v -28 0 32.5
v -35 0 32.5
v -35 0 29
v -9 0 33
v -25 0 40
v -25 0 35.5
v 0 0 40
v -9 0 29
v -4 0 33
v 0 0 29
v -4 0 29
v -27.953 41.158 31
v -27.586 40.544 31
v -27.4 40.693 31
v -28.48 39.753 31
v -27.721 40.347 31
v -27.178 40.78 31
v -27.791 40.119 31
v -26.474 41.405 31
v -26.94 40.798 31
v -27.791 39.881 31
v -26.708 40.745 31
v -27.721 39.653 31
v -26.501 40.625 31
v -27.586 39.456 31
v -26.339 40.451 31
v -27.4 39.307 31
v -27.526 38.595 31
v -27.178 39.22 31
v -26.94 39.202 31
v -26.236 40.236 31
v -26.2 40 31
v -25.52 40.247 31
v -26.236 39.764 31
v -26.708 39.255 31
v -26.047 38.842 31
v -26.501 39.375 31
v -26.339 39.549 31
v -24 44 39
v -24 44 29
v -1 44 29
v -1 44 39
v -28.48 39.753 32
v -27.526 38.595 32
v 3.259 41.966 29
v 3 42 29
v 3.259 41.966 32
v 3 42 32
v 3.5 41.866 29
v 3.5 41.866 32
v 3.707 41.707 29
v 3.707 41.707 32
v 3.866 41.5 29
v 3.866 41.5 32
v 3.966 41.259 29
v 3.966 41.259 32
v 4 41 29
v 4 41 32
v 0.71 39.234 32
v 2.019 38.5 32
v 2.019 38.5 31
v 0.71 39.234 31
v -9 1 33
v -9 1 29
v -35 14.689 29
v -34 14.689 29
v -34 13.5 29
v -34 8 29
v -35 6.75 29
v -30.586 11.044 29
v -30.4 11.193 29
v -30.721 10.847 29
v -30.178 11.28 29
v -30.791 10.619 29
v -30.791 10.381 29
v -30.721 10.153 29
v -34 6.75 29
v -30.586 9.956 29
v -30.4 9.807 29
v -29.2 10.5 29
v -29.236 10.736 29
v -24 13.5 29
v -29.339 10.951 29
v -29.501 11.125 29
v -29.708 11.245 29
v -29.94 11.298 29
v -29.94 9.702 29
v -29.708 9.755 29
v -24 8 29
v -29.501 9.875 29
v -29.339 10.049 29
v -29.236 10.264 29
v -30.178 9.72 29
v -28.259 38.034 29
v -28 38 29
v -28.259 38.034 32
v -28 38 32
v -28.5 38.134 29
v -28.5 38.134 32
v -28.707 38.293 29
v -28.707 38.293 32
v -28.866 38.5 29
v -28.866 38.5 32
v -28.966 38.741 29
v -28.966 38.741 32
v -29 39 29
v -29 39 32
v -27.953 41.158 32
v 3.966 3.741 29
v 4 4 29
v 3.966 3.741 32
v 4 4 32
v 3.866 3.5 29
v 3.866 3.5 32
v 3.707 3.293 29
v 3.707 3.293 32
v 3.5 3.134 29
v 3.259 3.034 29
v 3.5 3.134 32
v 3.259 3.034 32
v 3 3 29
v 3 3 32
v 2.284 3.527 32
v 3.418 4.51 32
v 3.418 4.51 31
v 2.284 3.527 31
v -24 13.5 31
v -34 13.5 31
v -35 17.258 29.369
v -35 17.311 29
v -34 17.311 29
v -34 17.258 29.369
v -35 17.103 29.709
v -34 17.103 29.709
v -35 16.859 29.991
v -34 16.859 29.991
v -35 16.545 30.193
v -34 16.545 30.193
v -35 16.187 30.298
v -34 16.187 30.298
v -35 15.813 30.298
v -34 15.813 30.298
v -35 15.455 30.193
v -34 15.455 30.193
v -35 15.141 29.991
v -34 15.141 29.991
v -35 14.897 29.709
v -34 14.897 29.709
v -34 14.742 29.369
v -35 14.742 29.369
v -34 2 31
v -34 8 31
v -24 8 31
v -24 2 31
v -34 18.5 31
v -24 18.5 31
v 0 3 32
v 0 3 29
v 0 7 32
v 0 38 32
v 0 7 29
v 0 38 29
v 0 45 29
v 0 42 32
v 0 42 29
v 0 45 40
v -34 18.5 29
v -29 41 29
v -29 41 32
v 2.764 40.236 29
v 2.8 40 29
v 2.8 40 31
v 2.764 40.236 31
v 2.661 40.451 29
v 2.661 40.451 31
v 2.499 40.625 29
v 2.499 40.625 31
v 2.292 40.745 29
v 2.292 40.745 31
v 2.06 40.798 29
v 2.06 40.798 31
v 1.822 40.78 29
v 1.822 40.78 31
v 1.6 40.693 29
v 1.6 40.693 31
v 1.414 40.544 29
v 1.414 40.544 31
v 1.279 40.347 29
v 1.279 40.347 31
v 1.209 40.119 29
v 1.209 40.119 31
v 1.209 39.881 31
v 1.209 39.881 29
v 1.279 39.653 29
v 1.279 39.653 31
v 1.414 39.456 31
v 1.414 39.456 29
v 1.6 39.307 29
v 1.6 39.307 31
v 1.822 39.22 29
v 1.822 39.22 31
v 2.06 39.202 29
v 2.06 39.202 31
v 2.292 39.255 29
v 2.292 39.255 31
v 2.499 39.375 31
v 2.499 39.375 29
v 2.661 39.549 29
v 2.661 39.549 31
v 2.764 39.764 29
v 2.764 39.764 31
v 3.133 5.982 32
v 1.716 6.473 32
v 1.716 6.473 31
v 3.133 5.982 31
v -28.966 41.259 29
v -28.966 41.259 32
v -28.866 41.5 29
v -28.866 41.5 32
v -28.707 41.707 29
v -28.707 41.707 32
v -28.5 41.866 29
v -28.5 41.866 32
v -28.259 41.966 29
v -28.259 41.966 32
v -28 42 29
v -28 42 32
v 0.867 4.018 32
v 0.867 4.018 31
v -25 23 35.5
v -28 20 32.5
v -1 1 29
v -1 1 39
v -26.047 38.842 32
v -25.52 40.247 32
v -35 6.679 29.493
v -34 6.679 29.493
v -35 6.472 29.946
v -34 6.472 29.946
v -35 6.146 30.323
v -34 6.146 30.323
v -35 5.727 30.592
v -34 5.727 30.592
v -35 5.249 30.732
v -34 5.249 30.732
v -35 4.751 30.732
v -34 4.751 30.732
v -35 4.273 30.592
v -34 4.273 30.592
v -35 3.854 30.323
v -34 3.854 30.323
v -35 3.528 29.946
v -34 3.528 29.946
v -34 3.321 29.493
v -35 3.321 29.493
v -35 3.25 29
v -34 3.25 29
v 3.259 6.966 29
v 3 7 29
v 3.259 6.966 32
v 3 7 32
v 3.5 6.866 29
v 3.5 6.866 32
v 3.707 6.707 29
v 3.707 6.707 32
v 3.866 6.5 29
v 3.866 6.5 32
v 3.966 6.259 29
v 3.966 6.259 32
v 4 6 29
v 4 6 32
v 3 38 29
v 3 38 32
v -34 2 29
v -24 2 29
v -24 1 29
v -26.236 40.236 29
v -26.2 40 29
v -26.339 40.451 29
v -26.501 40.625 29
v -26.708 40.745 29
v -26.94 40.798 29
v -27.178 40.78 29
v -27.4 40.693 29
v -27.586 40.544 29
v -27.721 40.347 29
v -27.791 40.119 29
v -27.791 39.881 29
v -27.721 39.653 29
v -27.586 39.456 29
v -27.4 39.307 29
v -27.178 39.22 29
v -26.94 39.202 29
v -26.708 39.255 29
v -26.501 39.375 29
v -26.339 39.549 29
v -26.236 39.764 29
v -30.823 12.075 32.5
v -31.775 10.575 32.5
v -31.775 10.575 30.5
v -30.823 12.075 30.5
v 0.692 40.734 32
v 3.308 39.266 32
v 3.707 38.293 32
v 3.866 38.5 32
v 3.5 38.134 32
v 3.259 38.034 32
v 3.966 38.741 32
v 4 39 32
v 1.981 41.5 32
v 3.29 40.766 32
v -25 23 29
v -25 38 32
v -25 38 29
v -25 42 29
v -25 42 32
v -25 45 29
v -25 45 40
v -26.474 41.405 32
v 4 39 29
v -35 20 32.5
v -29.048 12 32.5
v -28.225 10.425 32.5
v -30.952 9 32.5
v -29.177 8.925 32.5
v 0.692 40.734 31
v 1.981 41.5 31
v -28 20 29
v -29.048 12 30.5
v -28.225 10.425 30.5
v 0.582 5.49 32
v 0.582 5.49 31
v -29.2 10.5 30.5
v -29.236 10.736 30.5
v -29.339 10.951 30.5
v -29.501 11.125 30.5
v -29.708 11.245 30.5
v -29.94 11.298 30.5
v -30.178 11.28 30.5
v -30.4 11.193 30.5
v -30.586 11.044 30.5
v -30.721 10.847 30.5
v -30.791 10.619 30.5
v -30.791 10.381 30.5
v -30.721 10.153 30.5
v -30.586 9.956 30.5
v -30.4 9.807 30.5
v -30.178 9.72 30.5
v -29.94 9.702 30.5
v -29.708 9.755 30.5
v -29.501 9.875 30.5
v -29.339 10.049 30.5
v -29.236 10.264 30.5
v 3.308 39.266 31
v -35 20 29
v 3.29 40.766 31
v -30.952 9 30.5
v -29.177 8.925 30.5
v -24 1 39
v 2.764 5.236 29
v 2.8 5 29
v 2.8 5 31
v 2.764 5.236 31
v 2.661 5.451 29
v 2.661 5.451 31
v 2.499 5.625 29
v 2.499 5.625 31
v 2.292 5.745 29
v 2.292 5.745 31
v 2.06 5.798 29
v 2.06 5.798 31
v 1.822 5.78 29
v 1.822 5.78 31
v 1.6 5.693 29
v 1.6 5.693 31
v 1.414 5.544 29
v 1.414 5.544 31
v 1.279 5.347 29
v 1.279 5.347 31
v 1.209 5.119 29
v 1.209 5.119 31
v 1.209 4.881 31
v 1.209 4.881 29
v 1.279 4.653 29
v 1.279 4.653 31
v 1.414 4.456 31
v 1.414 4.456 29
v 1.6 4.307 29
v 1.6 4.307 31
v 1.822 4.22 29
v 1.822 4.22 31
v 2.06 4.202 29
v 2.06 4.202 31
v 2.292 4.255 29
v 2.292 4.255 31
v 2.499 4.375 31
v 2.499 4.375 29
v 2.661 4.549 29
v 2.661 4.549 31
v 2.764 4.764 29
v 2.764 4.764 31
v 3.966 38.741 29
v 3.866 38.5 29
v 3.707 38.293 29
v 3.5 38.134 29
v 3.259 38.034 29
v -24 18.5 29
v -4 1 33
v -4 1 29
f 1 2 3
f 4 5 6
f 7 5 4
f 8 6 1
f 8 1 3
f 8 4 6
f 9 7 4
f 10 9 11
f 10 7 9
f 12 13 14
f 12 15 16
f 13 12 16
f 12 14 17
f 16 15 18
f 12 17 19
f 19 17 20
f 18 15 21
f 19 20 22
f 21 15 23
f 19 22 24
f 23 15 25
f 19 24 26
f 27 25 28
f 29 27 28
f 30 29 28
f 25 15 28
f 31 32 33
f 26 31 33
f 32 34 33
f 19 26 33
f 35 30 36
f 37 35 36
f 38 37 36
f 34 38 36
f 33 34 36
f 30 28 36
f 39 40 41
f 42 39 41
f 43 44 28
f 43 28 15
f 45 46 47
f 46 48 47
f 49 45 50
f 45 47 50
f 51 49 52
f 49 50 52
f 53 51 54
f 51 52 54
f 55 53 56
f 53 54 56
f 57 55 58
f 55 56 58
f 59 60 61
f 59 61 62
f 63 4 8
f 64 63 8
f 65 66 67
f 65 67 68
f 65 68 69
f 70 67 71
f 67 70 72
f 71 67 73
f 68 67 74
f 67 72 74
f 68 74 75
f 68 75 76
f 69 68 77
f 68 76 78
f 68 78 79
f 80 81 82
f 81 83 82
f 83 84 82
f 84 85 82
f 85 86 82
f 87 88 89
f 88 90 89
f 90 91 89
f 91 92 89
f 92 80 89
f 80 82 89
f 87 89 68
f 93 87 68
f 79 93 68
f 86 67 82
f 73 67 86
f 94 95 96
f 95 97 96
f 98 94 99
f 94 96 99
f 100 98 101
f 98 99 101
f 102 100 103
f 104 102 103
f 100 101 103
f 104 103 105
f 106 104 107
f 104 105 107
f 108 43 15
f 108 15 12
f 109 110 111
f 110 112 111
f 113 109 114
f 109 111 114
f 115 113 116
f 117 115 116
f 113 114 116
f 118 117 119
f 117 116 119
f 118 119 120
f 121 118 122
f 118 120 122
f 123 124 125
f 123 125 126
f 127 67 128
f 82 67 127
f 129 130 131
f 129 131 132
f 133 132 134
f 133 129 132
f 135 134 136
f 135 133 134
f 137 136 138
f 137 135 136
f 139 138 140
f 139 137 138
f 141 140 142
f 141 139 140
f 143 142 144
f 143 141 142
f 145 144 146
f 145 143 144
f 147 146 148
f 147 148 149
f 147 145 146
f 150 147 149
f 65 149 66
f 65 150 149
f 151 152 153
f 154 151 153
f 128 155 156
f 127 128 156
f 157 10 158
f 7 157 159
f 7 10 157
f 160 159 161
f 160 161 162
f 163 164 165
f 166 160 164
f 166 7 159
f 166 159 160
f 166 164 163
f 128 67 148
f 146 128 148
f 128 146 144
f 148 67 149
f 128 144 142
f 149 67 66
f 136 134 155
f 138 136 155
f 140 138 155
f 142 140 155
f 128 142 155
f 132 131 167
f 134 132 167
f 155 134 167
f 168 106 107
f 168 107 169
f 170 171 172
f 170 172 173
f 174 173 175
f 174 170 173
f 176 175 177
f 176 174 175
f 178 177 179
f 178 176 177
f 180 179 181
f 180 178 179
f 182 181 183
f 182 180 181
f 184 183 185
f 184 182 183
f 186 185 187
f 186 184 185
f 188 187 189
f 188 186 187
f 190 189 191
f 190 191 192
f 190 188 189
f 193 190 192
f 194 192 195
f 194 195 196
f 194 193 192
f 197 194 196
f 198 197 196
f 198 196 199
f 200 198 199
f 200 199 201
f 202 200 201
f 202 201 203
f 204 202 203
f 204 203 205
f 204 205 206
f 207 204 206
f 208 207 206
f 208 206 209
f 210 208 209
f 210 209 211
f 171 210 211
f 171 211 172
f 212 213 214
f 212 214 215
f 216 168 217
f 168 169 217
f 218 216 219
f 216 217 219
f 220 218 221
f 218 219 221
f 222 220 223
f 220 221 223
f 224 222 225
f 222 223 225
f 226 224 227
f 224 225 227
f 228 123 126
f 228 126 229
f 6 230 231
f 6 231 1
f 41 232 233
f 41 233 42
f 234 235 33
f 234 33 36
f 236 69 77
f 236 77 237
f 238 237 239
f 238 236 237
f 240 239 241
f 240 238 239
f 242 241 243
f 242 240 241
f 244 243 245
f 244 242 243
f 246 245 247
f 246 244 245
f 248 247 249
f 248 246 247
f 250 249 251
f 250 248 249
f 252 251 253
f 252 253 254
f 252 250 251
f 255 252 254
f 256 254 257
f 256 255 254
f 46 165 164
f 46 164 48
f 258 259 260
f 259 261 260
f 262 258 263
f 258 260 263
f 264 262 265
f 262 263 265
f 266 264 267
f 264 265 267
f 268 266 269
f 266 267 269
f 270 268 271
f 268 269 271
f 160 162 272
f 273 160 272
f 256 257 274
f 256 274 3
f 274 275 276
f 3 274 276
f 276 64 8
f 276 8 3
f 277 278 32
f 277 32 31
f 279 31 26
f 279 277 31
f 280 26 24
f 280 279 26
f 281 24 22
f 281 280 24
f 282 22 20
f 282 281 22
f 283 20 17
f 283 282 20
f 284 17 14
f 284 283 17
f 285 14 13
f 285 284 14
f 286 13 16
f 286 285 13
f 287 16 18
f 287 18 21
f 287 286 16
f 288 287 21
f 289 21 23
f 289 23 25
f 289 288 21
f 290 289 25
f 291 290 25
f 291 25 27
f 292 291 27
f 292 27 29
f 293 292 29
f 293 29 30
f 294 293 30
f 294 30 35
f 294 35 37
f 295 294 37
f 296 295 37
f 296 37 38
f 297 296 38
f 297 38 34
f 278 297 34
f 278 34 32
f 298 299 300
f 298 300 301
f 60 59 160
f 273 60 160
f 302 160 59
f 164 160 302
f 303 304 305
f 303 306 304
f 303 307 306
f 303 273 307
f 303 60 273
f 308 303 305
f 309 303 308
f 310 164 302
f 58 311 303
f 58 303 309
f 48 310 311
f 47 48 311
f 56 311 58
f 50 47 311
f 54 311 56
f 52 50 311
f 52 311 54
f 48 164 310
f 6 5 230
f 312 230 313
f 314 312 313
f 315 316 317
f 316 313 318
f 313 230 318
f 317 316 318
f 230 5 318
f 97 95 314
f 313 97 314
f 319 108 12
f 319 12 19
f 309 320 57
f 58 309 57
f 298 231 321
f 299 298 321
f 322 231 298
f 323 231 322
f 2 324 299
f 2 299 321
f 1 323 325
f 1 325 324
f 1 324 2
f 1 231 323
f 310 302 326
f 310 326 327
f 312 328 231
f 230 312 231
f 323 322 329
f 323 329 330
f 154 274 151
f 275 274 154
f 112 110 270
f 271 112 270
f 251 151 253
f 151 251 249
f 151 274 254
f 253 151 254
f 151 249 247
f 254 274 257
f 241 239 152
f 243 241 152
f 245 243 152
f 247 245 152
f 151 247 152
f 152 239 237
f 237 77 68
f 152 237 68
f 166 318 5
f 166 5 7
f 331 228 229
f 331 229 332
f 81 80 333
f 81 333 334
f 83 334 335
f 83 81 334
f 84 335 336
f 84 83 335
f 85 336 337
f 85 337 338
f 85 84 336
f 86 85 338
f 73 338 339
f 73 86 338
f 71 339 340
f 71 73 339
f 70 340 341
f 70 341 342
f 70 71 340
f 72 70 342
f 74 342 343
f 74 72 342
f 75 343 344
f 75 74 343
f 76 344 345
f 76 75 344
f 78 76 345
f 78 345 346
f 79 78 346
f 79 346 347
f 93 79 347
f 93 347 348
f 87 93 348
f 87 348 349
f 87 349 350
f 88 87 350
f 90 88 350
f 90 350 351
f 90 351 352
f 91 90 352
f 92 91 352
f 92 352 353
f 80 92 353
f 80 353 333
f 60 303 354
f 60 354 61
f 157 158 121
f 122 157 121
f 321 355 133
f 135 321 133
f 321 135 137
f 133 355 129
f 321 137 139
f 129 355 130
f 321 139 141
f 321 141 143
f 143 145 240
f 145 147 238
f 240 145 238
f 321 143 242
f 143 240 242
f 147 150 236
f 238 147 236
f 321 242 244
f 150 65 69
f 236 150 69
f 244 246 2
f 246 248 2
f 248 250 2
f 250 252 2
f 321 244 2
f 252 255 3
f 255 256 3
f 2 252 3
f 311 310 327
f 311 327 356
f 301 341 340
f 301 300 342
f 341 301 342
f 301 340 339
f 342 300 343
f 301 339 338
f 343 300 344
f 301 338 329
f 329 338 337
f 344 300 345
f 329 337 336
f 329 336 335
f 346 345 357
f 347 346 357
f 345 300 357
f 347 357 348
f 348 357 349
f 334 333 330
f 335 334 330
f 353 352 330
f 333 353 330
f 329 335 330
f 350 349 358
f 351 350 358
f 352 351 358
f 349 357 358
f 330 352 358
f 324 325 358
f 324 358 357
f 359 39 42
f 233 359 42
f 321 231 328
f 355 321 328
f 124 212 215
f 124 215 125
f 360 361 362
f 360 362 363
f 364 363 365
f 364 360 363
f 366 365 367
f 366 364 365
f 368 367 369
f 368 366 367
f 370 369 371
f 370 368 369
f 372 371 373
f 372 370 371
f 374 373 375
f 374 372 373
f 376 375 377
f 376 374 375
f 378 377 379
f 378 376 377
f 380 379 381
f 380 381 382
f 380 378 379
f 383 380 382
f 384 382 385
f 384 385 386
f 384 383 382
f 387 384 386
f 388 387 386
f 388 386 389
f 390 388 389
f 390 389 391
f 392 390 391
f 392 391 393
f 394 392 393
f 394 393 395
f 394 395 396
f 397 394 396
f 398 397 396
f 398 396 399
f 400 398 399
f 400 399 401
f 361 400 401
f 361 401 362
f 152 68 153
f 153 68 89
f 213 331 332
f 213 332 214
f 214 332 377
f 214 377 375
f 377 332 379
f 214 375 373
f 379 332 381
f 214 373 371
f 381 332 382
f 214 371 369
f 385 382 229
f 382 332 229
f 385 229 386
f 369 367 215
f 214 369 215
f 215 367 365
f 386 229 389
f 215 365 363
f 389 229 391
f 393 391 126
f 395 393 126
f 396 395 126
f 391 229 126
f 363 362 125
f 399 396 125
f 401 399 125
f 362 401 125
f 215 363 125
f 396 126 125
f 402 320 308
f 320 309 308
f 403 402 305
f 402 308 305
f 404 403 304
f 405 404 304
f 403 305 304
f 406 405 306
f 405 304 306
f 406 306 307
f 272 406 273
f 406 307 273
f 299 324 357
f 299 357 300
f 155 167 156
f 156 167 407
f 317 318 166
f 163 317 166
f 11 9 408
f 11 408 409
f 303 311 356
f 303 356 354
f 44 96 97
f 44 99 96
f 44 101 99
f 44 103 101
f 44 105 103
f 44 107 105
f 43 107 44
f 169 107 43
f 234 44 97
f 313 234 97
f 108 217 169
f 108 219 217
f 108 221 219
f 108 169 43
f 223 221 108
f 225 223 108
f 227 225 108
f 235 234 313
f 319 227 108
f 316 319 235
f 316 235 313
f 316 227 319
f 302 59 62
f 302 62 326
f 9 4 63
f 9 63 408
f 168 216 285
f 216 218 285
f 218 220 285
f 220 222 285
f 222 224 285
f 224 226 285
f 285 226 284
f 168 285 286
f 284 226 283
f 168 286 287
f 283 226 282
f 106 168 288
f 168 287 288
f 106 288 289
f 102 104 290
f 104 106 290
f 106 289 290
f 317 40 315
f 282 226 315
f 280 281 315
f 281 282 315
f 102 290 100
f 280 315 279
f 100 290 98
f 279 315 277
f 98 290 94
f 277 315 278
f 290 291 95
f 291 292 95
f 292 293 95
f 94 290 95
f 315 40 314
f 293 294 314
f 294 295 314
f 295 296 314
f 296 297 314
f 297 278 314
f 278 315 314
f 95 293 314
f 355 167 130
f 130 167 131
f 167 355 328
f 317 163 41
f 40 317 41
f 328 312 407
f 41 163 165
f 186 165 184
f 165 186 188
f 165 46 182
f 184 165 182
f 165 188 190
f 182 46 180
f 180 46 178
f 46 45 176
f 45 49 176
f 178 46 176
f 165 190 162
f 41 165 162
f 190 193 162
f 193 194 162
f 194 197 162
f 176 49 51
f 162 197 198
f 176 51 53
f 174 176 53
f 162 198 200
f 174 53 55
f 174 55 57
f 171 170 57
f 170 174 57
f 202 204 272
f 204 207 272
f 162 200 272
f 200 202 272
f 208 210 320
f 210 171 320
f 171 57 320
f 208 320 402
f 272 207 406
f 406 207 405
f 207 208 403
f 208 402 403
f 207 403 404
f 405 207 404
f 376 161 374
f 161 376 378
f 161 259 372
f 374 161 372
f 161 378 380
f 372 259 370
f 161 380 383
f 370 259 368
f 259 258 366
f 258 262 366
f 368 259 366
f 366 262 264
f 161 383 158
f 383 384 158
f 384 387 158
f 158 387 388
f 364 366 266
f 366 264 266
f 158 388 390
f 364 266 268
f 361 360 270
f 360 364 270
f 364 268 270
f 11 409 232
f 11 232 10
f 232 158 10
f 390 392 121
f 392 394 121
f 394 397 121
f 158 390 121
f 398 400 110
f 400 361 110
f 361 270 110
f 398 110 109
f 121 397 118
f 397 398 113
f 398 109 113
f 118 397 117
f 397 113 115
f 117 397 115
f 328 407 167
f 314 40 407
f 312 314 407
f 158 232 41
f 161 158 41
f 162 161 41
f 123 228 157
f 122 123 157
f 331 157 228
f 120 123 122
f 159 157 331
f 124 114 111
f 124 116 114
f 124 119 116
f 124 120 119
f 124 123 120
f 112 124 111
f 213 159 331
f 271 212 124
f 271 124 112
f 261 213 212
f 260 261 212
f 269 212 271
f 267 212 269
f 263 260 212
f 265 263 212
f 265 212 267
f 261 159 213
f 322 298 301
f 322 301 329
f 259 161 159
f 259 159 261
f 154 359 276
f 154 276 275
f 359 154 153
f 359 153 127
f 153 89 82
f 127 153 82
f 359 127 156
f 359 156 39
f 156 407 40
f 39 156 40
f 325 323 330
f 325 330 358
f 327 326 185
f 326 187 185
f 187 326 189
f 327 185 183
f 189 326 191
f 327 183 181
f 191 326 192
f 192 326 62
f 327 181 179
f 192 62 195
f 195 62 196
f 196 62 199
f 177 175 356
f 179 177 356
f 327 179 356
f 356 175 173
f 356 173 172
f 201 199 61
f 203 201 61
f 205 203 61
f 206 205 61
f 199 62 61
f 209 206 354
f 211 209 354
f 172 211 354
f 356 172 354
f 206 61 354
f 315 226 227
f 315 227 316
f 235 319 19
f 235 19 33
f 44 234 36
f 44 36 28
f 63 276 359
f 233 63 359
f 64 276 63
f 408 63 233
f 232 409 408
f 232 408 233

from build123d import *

# Parameters (mm, degrees)
SKETCH_W        = 25
SKETCH_H        = 45
PAD_DEPTH       = 11
SKETCH001_W     = 20
SKETCH001_H     = 3.5
PAD001_DEPTH    = 10
SKETCH002_R     = 1.75
SKETCH002_R_2   = 1.311362
POCKET_DEPTH    = 12
SKETCH003_W     = 11
SKETCH003_H     = 5
SKETCH003_H_2   = 6
POCKET001_DEPTH = 2
SKETCH005_W     = 23
SKETCH005_H     = 43
POCKET002_DEPTH = 10
CHAMFER_SIZE    = 3
CHAMFER001_SIZE = 3
SKETCH006_W     = 5
SKETCH006_H     = 4
POCKET003_DEPTH = 1
SKETCH007_R     = 0.8
POCKET004_DEPTH = 5
POCKET005_DEPTH = 2
SKETCH009_W     = 4
SKETCH009_H     = 4
PAD002_DEPTH    = 3
SKETCH010_R     = 0.8
POCKET006_DEPTH = 5
POCKET007_DEPTH = 1
SKETCH012_R     = 0.8
POCKET008_DEPTH = 5
POCKET009_DEPTH = 1
SKETCH014_R     = 0.8
POCKET010_DEPTH = 5
POCKET011_DEPTH = 1
FILLET_R        = 1
FILLET001_R     = 1
FILLET002_R     = 1
FILLET003_R     = 1
FILLET004_R     = 1
FILLET005_R     = 1


with BuildPart() as pad:
    # Sketch → Pad (new body)
    with BuildSketch(Plane.XY):
        with Locations((-12.5, 22.5)):
            Rectangle(SKETCH_W, SKETCH_H)
    extrude(amount=PAD_DEPTH)


with BuildPart() as pad001:
    # Pad001 base: copy of Pad
    add(pad.part)

    # Sketch001 (on Face2 of Pad) → Pad001 (new body)
    with BuildSketch(Plane(origin=(-25, 0, 0), x_dir=(0, -1, 0), z_dir=(-1, 0, 0))):
        with Locations((-10, 9.25)):
            Rectangle(SKETCH001_W, SKETCH001_H)
    extrude(amount=PAD001_DEPTH)


with BuildPart() as fillet005:
    # Fusion base: copy of Pad
    add(pad.part)

    # Fusion: union Pad001
    add(pad001.part)

    # Sketch002 (on Face1 of Fusion) → Pocket (cut)
    with BuildSketch(Plane(origin=(-35, 0, 0), x_dir=(0, -1, 0), z_dir=(-1, 0, 0))):
        with Locations((-5, 11)):
            Circle(SKETCH002_R)
        with Locations((-16, 11)):
            Circle(SKETCH002_R_2)
    extrude(amount=-POCKET_DEPTH, mode=Mode.SUBTRACT)

    # Sketch003 (on Face6 of Pocket) → Pocket001 (cut)
    with BuildSketch(Plane.XY.offset(11)):
        with Locations((-28.5, 16)):
            Rectangle(SKETCH003_W, SKETCH003_H)
        with Locations((-28.5, 5)):
            Rectangle(SKETCH003_W, SKETCH003_H_2)
    extrude(amount=-POCKET001_DEPTH, mode=Mode.SUBTRACT)

    # Sketch005 (on Face10 of Pocket001) → Pocket002 (cut)
    with BuildSketch(Plane.XY.offset(11)):
        with Locations((-12.5, 22.5)):
            Rectangle(SKETCH005_W, SKETCH005_H)
    extrude(amount=-POCKET002_DEPTH, mode=Mode.SUBTRACT)

    # Chamfer
    chamfer_edges = [fillet005.edges().sort_by_distance(p)[0] for p in [
        (-25, 10, 7.5),
    ]]
    chamfer(chamfer_edges, length=CHAMFER_SIZE)

    # Chamfer001
    chamfer001_edges = [fillet005.edges().sort_by_distance(p)[0] for p in [
        (-25, 20, 9.25),
        (-25, 20, 6),
    ]]
    chamfer(chamfer001_edges, length=CHAMFER001_SIZE)

    # Sketch006 (on Face12 of Chamfer001) → Pocket003 (cut)
    with BuildSketch(Plane.XZ):
        with Locations((-6.5, 9)):
            Rectangle(SKETCH006_W, SKETCH006_H)
    extrude(amount=-POCKET003_DEPTH, mode=Mode.SUBTRACT)

    # Sketch007 (on Face16 of Pocket003) → Pocket004 (cut)
    with BuildSketch(Plane.XY.offset(11)):
        with Locations((-30, 10.5)):
            Circle(SKETCH007_R)
    extrude(amount=-POCKET004_DEPTH, mode=Mode.SUBTRACT)

    # Sketch008 (on Face3 of Pocket004) → Pocket005 (cut)
    with BuildSketch(Plane(origin=(0, 0, 7.5), x_dir=(1, 0, 0), z_dir=(0, 0, -1))):
        Polygon((-29.047812, -12), (-28.224868, -10.425381), (-29.177056, -8.925381), (-30.952188, -9), (-31.775132, -10.574619), (-30.822944, -12.074619), align=None)
    extrude(amount=-POCKET005_DEPTH, mode=Mode.SUBTRACT)

    # Sketch009 (on Face15 of Pocket005) → Pad002 (new body)
    with BuildSketch(Plane.XY.offset(11)):
        with Locations((-27, 40)):
            Rectangle(SKETCH009_W, SKETCH009_H)
        with Locations((2, 40)):
            Rectangle(SKETCH009_W, SKETCH009_H)
        with Locations((2, 5)):
            Rectangle(SKETCH009_W, SKETCH009_H)
    extrude(amount=-PAD002_DEPTH)

    # Sketch010 (on Face33 of Pad002) → Pocket006 (cut)
    with BuildSketch(Plane.XY.offset(11)):
        with Locations((-27, 40)):
            Circle(SKETCH010_R)
    extrude(amount=-POCKET006_DEPTH, mode=Mode.SUBTRACT)

    # Sketch011 (on Face20 of Pocket006) → Pocket007 (cut)
    with BuildSketch(Plane(origin=(0, 0, 8), x_dir=(1, 0, 0), z_dir=(0, 0, -1))):
        Polygon((-25.520394, -40.24651), (-26.046714, -38.841879), (-27.526319, -38.595369), (-28.479606, -39.75349), (-27.953286, -41.158121), (-26.473681, -41.404631), align=None)
    extrude(amount=-POCKET007_DEPTH, mode=Mode.SUBTRACT)

    # Sketch012 (on Face37 of Pocket007) → Pocket008 (cut)
    with BuildSketch(Plane.XY.offset(11)):
        with Locations((2, 40)):
            Circle(SKETCH012_R)
    extrude(amount=-POCKET008_DEPTH, mode=Mode.SUBTRACT)

    # Sketch013 (on Face59 of Pocket008) → Pocket009 (cut)
    with BuildSketch(Plane(origin=(0, 0, 8), x_dir=(1, 0, 0), z_dir=(0, 0, -1))):
        Polygon((3.289533, -40.766227), (3.308339, -39.266345), (2.018806, -38.500118), (0.710467, -39.233773), (0.691661, -40.733655), (1.981194, -41.499882), align=None)
    extrude(amount=-POCKET009_DEPTH, mode=Mode.SUBTRACT)

    # Sketch014 (on Face40 of Pocket009) → Pocket010 (cut)
    with BuildSketch(Plane.XY.offset(11)):
        with Locations((2, 5)):
            Circle(SKETCH014_R)
    extrude(amount=-POCKET010_DEPTH, mode=Mode.SUBTRACT)

    # Sketch015 (on Face56 of Pocket010) → Pocket011 (cut)
    with BuildSketch(Plane(origin=(0, 0, 8), x_dir=(1, 0, 0), z_dir=(0, 0, -1))):
        Polygon((3.133484, -5.982453), (3.417571, -4.5096), (2.284087, -3.527147), (0.866516, -4.017547), (0.582429, -5.4904), (1.715913, -6.472853), align=None)
    extrude(amount=-POCKET011_DEPTH, mode=Mode.SUBTRACT)

    # Fillet
    fillet_edges = [fillet005.edges().sort_by_distance(p)[0] for p in [
        (-29, 38, 9.5),
    ]]
    fillet(fillet_edges, radius=FILLET_R)

    # Fillet001
    fillet001_edges = [fillet005.edges().sort_by_distance(p)[0] for p in [
        (-29, 42, 9.5),
    ]]
    fillet(fillet001_edges, radius=FILLET001_R)

    # Fillet002
    fillet002_edges = [fillet005.edges().sort_by_distance(p)[0] for p in [
        (4, 42, 9.5),
    ]]
    fillet(fillet002_edges, radius=FILLET002_R)

    # Fillet003
    fillet003_edges = [fillet005.edges().sort_by_distance(p)[0] for p in [
        (4, 38, 9.5),
    ]]
    fillet(fillet003_edges, radius=FILLET003_R)

    # Fillet004
    fillet004_edges = [fillet005.edges().sort_by_distance(p)[0] for p in [
        (4, 7, 9.5),
    ]]
    fillet(fillet004_edges, radius=FILLET004_R)

    # Fillet005
    fillet005_edges = [fillet005.edges().sort_by_distance(p)[0] for p in [
        (4, 3, 9.5),
    ]]
    fillet(fillet005_edges, radius=FILLET005_R)


with BuildPart() as part_mirroring:
    # Part__Mirroring: instance of Fillet005
    add(fillet005.part.mirror(Plane(origin=(0, 0, 20), x_dir=(0, 1, 0), z_dir=(0, 0, 1))))


solid = part_mirroring.part
